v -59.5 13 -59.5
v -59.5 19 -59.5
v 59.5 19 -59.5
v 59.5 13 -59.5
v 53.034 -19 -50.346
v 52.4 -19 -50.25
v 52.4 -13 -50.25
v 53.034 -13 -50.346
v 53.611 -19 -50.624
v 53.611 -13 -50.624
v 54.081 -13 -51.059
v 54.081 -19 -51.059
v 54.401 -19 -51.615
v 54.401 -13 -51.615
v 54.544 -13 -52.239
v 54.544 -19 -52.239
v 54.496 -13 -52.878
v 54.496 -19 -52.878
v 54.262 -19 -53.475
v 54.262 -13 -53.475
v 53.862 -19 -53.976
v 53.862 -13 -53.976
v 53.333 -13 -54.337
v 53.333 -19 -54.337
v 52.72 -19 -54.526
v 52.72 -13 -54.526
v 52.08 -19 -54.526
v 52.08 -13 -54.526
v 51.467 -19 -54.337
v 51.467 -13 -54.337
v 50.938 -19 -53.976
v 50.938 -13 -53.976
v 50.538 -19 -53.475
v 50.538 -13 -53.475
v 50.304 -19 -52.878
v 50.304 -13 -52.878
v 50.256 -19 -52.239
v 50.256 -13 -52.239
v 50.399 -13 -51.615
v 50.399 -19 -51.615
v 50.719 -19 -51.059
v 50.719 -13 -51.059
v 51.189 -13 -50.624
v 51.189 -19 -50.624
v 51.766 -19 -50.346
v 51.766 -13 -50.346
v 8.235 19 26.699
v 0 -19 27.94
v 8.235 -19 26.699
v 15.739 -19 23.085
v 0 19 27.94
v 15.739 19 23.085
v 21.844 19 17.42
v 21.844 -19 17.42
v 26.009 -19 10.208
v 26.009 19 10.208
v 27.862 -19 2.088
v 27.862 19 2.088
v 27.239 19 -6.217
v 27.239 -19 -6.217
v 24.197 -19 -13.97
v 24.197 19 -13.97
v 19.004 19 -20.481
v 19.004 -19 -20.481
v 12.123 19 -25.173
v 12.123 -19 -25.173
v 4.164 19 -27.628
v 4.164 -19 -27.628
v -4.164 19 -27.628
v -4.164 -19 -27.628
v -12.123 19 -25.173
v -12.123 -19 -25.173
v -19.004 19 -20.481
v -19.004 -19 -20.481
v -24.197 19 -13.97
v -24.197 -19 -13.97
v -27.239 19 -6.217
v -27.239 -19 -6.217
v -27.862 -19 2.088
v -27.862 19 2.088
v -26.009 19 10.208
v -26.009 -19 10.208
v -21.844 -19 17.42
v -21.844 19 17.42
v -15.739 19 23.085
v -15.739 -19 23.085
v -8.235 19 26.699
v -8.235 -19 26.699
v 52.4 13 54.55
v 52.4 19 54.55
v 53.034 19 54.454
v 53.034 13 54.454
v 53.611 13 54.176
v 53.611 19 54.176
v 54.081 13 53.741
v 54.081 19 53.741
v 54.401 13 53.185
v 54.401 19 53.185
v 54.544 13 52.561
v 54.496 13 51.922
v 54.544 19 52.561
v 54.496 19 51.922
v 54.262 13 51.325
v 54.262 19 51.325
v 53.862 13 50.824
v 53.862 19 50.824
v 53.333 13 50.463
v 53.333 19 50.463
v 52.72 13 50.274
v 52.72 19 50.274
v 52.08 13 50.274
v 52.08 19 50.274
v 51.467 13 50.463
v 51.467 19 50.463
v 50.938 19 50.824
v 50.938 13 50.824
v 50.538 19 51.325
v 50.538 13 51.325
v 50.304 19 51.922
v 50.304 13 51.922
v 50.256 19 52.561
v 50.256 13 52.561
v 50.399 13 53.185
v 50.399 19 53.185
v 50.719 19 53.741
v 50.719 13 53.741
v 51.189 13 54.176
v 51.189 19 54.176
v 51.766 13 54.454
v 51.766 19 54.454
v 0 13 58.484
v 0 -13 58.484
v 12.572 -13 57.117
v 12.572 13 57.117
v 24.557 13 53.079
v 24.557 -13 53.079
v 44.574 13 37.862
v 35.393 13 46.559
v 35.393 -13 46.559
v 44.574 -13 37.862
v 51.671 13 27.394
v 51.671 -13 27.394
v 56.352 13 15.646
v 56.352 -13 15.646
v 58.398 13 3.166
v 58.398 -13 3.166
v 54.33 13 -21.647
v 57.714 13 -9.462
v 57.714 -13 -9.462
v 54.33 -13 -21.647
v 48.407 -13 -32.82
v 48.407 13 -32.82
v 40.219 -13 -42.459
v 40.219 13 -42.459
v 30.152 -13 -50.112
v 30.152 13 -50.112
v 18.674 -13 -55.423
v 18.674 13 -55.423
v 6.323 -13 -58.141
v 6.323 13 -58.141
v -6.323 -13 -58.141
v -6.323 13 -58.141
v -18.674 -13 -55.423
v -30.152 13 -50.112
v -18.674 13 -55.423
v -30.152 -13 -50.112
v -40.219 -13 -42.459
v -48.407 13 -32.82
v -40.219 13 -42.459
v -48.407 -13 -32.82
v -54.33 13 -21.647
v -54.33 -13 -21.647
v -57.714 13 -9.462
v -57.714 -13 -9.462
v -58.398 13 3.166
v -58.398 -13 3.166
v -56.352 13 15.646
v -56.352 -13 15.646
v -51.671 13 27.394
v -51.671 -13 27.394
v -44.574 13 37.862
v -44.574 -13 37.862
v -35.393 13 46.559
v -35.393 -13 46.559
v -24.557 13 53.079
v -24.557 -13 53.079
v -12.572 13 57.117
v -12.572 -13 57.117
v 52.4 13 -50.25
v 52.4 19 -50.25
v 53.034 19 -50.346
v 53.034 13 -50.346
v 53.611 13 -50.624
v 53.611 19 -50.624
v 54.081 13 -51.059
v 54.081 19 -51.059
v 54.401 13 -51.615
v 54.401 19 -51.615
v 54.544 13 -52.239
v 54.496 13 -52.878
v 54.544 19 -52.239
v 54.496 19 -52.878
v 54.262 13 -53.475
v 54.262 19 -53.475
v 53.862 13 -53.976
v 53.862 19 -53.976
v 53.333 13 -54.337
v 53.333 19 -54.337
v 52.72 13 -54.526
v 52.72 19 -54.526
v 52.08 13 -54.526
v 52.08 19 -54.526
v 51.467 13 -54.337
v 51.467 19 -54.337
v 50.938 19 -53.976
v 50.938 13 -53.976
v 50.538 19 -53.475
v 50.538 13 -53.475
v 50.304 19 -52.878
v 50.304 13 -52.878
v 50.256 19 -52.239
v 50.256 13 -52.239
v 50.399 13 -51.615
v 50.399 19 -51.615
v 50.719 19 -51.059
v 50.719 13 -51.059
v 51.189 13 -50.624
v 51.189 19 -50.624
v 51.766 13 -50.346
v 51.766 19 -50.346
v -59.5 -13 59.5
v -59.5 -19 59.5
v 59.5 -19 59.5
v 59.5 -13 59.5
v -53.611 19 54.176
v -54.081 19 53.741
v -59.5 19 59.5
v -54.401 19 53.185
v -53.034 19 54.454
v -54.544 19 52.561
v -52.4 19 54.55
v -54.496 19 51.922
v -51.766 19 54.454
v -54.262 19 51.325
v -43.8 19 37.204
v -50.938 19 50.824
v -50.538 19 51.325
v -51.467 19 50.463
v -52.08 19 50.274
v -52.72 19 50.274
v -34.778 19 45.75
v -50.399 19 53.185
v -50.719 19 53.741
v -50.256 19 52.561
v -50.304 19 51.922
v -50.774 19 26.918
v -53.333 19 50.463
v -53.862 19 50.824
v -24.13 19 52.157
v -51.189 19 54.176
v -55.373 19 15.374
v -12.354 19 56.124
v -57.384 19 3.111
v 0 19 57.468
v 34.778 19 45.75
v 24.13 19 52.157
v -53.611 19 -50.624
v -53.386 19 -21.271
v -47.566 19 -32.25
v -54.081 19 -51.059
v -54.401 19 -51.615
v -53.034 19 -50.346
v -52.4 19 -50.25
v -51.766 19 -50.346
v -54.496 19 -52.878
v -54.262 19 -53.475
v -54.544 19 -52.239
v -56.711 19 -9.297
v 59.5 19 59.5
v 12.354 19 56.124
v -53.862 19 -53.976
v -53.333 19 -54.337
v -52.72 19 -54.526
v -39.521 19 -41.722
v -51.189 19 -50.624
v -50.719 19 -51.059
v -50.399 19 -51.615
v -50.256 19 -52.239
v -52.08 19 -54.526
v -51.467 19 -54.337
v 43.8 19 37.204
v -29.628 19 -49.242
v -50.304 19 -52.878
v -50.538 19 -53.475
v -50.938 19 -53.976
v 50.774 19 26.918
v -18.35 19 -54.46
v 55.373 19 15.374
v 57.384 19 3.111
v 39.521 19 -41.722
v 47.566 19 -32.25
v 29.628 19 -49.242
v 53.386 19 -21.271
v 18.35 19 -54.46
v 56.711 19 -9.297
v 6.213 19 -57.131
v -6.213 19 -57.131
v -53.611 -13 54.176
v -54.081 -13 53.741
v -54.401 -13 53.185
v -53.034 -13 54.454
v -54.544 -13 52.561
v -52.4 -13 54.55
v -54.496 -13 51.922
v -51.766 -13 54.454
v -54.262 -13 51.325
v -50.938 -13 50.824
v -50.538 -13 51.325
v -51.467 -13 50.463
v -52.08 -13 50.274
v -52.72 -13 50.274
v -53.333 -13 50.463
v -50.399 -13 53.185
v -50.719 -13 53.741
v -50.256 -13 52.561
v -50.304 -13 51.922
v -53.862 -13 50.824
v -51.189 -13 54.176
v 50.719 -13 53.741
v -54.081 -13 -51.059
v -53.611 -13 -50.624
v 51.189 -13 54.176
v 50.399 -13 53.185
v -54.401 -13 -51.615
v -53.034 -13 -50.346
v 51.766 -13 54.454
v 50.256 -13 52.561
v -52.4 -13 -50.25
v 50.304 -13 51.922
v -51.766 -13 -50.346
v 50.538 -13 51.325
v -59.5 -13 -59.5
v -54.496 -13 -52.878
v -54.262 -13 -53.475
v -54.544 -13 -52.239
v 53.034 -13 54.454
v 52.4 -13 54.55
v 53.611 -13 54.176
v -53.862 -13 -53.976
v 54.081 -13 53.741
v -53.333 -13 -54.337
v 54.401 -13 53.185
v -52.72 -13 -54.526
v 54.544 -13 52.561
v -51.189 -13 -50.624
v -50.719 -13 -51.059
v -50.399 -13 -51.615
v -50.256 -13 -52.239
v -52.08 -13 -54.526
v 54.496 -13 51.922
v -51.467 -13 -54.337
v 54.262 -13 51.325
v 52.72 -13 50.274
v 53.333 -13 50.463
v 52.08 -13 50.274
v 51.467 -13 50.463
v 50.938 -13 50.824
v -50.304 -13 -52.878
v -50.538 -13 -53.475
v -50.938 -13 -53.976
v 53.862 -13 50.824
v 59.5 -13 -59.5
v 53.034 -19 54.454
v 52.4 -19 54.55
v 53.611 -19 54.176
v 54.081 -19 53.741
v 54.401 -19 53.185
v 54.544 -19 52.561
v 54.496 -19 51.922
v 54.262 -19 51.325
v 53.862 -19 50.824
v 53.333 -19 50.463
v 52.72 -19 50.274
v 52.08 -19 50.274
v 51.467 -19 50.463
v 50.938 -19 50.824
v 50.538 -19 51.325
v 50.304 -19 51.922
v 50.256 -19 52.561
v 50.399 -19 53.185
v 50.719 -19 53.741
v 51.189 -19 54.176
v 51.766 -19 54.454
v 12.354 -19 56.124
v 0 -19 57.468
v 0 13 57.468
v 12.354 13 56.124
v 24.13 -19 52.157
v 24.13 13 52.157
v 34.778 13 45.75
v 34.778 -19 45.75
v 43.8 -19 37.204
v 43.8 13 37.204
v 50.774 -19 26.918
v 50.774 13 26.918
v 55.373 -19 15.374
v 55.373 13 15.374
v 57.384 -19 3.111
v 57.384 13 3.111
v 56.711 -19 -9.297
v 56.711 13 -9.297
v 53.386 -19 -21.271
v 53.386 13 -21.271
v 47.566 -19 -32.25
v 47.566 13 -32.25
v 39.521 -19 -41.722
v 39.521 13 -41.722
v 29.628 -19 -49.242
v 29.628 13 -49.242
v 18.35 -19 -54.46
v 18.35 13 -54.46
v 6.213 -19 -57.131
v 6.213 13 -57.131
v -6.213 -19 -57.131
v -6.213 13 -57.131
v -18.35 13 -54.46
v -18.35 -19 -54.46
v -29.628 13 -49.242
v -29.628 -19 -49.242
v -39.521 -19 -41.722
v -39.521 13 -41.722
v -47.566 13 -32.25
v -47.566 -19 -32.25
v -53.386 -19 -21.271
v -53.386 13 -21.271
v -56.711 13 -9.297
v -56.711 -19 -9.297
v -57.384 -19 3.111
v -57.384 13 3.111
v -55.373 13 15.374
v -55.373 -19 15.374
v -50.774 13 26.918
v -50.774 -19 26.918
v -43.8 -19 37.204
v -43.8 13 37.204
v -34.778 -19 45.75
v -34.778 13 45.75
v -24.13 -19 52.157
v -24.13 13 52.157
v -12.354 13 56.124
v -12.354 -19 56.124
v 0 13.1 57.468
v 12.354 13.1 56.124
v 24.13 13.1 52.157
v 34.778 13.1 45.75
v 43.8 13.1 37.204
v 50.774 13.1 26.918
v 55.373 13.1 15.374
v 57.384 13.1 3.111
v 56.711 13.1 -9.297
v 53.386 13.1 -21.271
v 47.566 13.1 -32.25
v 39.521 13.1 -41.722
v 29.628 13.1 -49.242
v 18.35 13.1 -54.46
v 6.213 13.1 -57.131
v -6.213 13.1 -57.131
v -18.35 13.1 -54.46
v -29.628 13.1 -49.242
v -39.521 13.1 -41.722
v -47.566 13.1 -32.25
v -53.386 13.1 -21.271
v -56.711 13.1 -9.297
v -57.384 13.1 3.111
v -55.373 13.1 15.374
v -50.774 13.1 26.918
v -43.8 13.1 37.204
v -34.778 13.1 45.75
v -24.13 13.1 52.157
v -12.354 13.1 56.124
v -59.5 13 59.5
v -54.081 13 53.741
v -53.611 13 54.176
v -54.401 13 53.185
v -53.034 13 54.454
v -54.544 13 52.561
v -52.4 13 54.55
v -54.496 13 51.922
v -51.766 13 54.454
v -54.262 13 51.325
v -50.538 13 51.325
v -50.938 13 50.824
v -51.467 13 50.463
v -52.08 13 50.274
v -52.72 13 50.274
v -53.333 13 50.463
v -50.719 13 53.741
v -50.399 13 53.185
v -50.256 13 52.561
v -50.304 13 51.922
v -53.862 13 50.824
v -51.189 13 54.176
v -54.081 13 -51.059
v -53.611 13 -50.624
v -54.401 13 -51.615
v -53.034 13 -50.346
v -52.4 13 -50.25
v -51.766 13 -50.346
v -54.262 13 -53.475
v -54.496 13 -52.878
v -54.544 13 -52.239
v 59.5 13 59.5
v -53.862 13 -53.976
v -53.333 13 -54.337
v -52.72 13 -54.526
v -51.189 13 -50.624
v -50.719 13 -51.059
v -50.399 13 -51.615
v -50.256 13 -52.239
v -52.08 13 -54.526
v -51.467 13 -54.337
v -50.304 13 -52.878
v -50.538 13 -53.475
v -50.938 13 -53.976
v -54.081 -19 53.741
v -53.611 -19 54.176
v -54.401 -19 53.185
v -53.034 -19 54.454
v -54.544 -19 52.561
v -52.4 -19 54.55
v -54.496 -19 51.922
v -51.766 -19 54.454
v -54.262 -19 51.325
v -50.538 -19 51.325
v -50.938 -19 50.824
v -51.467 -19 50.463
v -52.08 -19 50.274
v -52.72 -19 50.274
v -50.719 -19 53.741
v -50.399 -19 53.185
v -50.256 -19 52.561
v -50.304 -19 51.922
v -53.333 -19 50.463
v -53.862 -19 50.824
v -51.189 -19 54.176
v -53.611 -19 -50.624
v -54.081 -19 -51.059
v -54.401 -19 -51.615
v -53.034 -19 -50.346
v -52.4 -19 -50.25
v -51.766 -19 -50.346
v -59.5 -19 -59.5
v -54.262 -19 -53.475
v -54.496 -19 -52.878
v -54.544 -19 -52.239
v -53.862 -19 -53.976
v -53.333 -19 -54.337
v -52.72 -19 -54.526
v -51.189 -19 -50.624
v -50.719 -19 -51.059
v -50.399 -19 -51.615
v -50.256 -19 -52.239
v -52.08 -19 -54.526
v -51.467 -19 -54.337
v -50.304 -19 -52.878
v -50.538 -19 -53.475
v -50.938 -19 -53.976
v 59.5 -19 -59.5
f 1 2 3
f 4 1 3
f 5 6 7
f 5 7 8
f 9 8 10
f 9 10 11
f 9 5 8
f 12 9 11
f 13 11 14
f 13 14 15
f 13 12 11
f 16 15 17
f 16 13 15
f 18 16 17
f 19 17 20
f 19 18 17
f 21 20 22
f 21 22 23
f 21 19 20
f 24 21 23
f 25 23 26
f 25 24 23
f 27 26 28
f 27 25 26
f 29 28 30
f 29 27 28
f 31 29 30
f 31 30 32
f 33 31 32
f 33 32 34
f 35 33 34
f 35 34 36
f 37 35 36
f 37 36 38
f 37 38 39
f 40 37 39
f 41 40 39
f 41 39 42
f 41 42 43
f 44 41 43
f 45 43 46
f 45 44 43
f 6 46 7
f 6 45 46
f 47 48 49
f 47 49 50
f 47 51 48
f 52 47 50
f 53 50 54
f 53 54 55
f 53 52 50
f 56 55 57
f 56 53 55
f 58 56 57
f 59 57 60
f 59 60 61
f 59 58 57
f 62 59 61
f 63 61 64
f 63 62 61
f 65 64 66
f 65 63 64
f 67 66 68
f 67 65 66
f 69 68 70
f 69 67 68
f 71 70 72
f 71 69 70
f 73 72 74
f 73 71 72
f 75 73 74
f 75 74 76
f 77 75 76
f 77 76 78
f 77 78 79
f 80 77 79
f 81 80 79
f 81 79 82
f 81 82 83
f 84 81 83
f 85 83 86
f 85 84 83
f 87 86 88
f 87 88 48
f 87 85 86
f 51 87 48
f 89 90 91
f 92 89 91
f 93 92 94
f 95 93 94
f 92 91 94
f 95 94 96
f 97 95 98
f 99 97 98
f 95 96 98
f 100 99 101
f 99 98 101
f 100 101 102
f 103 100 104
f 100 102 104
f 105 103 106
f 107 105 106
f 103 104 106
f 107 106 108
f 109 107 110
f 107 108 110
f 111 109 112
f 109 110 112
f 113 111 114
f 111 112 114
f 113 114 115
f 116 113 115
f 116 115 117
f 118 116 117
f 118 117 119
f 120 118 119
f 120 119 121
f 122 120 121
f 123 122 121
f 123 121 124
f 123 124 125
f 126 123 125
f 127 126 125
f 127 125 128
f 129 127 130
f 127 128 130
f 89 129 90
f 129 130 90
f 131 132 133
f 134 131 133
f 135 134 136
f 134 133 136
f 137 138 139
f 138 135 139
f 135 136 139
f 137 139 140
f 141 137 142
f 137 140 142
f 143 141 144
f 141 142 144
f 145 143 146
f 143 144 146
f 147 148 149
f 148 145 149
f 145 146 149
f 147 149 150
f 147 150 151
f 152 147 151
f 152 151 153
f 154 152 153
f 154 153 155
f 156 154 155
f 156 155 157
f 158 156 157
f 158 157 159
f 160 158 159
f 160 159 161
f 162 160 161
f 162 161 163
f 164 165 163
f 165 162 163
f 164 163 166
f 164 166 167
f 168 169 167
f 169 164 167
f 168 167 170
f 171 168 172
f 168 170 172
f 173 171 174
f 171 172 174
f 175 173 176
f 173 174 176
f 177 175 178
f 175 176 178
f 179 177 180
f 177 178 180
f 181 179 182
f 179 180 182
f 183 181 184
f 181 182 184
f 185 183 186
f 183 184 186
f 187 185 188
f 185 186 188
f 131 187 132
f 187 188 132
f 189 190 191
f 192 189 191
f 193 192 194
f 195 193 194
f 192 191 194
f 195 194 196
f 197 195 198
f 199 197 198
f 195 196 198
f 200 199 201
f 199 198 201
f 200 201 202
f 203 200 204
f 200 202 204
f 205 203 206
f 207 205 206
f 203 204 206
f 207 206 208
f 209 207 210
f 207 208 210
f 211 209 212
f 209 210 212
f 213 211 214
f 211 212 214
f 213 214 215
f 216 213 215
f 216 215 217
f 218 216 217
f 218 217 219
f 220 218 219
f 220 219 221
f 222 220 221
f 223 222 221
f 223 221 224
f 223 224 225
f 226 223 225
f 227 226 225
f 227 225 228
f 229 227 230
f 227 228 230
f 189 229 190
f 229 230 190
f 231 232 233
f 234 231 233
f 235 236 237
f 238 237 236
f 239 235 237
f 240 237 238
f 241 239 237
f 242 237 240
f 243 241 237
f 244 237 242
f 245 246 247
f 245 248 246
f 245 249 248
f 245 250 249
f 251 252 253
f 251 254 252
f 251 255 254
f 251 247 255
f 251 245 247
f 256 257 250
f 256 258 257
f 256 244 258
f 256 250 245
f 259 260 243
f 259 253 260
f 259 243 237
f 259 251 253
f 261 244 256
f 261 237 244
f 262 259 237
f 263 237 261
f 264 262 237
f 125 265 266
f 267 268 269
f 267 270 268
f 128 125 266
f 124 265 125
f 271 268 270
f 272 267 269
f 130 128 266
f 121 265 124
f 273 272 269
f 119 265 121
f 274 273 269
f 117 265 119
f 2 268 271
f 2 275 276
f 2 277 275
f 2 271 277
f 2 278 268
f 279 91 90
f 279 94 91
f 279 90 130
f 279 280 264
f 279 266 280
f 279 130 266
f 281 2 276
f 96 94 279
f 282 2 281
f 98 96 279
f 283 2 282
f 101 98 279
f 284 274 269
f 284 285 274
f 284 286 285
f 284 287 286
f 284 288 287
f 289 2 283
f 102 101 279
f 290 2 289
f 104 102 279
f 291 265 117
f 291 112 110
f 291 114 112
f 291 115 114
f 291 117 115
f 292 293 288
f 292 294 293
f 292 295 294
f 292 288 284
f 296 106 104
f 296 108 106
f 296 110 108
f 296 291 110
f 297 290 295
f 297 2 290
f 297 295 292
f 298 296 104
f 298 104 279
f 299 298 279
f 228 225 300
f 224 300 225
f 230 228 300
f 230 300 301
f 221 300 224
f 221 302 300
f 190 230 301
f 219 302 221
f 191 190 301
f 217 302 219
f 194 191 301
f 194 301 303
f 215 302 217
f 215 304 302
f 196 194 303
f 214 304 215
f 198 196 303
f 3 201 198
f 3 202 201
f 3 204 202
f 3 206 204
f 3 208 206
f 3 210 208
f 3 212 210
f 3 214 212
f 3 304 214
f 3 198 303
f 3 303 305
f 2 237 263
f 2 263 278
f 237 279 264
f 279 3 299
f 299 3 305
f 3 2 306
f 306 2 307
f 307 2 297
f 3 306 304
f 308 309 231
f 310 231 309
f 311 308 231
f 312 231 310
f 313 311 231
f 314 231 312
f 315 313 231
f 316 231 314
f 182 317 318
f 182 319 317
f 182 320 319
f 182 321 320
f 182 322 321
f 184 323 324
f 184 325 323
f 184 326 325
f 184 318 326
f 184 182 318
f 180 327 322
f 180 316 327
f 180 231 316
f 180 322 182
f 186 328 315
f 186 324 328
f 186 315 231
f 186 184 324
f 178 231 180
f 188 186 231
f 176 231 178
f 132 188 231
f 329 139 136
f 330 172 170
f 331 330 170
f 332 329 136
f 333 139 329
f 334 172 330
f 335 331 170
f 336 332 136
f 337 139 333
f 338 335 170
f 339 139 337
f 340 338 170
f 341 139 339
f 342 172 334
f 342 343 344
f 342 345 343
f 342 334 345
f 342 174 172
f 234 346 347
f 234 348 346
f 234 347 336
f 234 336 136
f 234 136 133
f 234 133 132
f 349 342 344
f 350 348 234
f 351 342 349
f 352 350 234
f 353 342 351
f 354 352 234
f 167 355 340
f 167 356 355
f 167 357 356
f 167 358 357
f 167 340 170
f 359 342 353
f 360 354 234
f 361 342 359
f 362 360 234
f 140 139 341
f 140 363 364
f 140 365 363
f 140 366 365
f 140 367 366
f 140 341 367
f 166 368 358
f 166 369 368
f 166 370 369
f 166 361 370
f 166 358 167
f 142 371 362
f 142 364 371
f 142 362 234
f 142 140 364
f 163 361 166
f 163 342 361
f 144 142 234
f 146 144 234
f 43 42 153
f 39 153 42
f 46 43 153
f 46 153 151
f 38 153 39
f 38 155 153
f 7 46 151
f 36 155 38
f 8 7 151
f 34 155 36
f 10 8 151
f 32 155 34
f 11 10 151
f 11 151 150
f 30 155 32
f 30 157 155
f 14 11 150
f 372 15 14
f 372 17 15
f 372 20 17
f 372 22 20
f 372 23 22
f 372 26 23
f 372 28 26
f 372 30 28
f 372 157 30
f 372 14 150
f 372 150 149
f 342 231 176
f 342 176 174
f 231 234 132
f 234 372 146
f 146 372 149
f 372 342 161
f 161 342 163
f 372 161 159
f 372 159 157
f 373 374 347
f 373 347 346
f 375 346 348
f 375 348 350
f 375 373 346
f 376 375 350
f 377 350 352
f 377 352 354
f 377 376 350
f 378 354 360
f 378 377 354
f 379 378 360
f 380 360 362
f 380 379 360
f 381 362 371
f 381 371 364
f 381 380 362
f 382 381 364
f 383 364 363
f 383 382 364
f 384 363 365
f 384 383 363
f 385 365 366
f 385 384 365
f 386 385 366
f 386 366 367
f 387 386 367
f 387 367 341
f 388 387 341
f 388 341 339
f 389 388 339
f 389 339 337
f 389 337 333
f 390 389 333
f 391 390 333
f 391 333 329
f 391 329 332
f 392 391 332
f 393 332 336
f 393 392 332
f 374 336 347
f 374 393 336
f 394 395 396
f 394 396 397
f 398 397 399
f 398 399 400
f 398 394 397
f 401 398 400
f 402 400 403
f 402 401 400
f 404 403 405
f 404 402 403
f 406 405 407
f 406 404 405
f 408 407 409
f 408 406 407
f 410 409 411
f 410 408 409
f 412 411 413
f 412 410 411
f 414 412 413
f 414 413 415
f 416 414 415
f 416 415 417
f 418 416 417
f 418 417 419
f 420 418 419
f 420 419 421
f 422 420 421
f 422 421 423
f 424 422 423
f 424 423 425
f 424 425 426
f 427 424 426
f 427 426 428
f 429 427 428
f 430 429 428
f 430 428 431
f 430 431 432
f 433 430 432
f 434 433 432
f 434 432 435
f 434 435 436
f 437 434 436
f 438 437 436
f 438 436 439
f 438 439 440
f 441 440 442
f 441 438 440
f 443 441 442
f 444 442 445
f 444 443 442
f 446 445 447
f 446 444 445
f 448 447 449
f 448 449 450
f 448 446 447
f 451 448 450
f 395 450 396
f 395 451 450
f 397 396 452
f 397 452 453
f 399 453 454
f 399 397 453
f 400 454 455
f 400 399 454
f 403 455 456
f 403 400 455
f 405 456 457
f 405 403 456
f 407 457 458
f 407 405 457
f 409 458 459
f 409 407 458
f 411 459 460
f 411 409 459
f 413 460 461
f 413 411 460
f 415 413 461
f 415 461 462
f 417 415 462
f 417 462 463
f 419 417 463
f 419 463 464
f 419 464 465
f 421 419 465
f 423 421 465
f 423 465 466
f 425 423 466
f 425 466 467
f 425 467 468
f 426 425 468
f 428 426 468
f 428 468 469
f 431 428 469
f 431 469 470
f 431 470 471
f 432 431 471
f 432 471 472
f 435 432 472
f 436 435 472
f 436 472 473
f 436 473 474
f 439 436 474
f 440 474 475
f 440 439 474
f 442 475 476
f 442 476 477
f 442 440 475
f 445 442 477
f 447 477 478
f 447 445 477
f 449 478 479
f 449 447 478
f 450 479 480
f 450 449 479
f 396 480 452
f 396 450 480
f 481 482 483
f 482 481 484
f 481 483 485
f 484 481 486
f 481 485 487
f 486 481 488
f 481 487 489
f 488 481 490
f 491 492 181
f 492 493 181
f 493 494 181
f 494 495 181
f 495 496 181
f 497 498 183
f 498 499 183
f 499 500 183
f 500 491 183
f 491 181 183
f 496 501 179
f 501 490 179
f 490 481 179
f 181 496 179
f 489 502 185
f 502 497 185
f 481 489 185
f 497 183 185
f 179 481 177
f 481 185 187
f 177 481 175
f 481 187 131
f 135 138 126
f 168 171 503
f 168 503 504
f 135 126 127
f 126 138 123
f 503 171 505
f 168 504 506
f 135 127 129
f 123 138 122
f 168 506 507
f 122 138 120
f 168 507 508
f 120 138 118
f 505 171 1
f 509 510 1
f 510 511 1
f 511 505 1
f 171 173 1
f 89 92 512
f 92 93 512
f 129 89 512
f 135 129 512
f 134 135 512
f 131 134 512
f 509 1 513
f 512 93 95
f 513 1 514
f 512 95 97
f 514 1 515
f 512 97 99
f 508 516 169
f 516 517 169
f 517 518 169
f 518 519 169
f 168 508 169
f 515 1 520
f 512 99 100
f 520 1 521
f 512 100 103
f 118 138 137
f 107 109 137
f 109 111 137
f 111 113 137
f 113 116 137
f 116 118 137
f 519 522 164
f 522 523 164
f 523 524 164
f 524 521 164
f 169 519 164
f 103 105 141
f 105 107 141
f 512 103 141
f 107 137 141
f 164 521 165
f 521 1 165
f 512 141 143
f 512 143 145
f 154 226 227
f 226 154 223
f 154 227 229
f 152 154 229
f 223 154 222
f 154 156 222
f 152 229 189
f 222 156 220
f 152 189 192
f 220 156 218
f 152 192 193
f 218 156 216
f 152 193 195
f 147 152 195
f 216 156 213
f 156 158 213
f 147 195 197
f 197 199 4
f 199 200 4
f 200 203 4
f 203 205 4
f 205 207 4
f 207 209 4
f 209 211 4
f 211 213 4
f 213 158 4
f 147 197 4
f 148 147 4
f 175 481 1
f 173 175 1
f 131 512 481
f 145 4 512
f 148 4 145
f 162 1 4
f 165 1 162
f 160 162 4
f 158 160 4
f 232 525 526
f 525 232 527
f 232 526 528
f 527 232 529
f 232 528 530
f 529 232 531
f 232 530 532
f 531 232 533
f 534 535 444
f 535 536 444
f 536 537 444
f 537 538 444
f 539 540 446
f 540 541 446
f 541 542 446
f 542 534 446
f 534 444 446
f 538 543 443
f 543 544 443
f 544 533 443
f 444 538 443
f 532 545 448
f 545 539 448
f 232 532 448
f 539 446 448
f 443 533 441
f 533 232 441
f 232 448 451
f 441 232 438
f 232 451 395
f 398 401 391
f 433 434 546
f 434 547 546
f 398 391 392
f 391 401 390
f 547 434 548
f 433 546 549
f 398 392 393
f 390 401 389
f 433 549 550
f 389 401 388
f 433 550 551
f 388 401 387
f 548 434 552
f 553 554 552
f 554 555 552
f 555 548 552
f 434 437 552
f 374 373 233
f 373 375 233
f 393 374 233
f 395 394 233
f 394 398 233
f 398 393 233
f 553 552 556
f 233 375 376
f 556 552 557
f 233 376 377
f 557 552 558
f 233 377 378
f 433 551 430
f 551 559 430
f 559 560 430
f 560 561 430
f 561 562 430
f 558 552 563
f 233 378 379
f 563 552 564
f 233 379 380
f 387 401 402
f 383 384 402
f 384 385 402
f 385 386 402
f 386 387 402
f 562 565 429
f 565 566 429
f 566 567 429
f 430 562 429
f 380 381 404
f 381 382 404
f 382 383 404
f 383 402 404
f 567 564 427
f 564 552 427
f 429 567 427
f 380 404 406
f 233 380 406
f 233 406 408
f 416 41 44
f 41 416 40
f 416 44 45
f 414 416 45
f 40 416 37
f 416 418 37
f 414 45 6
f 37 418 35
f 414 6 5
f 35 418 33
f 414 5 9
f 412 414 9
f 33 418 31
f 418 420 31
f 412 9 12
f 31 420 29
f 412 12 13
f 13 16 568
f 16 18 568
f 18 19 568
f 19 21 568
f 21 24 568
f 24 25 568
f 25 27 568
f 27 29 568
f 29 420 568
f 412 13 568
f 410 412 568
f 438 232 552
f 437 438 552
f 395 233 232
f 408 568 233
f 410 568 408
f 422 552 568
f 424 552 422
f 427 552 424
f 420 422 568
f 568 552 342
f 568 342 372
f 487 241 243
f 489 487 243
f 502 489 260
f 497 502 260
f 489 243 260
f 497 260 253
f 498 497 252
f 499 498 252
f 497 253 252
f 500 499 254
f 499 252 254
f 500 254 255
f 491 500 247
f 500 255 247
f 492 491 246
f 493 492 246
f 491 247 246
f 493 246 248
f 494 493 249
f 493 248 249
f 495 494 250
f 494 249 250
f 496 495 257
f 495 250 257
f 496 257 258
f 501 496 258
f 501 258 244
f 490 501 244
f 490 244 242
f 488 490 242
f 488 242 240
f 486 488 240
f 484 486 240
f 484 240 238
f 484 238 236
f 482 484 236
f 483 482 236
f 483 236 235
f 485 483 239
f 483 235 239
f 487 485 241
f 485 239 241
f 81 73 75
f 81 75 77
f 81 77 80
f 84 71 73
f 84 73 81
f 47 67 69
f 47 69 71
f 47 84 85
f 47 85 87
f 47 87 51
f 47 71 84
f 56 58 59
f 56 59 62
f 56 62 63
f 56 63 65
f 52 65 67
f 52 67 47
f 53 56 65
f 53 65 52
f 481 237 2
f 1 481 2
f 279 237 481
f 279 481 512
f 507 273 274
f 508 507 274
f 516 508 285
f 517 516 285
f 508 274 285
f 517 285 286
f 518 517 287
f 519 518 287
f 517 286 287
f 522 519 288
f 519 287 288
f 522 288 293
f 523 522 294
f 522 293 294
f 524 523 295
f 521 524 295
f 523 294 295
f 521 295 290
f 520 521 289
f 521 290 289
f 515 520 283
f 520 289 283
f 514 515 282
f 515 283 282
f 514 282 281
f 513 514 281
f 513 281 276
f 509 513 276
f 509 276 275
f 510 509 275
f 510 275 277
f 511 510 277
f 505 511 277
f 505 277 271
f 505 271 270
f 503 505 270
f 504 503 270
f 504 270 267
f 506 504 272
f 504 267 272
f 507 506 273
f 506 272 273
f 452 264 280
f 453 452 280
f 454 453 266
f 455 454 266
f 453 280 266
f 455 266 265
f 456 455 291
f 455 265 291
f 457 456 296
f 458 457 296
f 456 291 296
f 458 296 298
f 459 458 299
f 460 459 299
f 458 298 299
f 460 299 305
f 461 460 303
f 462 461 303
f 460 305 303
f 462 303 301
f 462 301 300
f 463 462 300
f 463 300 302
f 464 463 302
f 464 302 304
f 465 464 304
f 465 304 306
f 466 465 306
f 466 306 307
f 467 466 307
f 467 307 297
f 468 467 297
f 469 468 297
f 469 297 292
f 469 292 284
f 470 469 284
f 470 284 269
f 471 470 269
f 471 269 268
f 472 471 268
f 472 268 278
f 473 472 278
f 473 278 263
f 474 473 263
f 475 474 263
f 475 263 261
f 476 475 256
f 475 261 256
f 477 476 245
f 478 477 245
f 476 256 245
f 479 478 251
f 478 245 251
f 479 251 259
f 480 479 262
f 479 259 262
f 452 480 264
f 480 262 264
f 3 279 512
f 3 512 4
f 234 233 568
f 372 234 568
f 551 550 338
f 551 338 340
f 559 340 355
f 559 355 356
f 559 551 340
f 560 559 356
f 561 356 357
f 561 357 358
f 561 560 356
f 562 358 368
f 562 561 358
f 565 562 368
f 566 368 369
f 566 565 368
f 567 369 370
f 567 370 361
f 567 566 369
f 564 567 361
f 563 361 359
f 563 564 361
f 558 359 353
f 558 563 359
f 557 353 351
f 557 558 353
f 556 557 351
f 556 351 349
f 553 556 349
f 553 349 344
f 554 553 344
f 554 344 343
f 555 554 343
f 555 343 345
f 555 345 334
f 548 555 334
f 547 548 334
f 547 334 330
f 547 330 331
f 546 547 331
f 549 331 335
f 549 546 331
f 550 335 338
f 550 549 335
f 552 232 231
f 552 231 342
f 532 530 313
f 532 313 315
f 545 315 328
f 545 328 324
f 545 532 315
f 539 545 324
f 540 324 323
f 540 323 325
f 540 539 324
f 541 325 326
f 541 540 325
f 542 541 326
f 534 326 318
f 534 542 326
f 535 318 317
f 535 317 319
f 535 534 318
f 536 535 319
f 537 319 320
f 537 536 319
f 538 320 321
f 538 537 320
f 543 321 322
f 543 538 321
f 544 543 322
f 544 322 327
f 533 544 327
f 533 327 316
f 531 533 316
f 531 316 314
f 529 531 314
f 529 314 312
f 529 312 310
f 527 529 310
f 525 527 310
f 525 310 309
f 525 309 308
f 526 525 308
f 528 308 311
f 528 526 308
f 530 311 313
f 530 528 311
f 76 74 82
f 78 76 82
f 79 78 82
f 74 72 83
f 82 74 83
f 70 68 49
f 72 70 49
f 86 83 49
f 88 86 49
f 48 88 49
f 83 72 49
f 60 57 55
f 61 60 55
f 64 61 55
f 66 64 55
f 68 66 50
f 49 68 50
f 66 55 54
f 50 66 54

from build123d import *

# Parameters (mm, degrees)
BOSS_EXTRUDE1_START = -19
SKETCH1_W           = 119
SKETCH1_H           = 119
SKETCH1_R           = 57.468
SKETCH1_R_2         = 2.15
BOSS_EXTRUDE1_DEPTH = 6
BOSS_EXTRUDE2_START = -0.1
SKETCH2_R           = 58.484
SKETCH2_R_2         = 57.468
BOSS_EXTRUDE2_DEPTH = 26.2
SKETCH3_R           = 27.94
BOSS_EXTRUDE3_DEPTH = 19


with BuildPart() as part:
    # Sketch1 → Boss-Extrude1 (new body)
    with BuildSketch(Plane(origin=(0, 0, 0), x_dir=(1, 0, 0), z_dir=(0, 1, 0)).offset(BOSS_EXTRUDE1_START)):
        Rectangle(SKETCH1_W, SKETCH1_H)
        with Locations(Location((0, 0, 0), (0, 0, 270))):
            Circle(SKETCH1_R, mode=Mode.SUBTRACT)
        with Locations(Location((-52.4, 52.4, 0), (0, 0, 270))):
            Circle(SKETCH1_R_2, mode=Mode.SUBTRACT)
        with Locations(Location((52.4, 52.4, 0), (0, 0, 270))):
            Circle(SKETCH1_R_2, mode=Mode.SUBTRACT)
        with Locations(Location((52.4, -52.4, 0), (0, 0, 270))):
            Circle(SKETCH1_R_2, mode=Mode.SUBTRACT)
        with Locations(Location((-52.4, -52.4, 0), (0, 0, 270))):
            Circle(SKETCH1_R_2, mode=Mode.SUBTRACT)
    boss_extrude1 = extrude(amount=BOSS_EXTRUDE1_DEPTH)

    # Sketch2 → Boss-Extrude2 (add)
    with BuildSketch(Plane(origin=(0, -13, 0), x_dir=(-1, 0, 0), z_dir=(0, 1, 0)).offset(BOSS_EXTRUDE2_START)):
        with Locations(Location((0, 0, 0), (0, 0, 90))):
            Circle(SKETCH2_R)
        with Locations(Location((0, 0, 0), (0, 0, 90))):
            Circle(SKETCH2_R_2, mode=Mode.SUBTRACT)
    extrude(amount=BOSS_EXTRUDE2_DEPTH)

    # Mirror5: Boss-Extrude1 across plane
    add(boss_extrude1.mirror(Plane.ZX))


with BuildPart() as body_2:
    # Sketch3 → Boss-Extrude3 (new, symmetric)
    with BuildSketch(Plane(origin=(0, 0, 0), x_dir=(1, 0, 0), z_dir=(0, 1, 0))):
        with Locations(Location((0, 0, 0), (0, 0, 270))):
            Circle(SKETCH3_R)
    extrude(amount=BOSS_EXTRUDE3_DEPTH, both=True)


solid = Compound([part.part, body_2.part])
